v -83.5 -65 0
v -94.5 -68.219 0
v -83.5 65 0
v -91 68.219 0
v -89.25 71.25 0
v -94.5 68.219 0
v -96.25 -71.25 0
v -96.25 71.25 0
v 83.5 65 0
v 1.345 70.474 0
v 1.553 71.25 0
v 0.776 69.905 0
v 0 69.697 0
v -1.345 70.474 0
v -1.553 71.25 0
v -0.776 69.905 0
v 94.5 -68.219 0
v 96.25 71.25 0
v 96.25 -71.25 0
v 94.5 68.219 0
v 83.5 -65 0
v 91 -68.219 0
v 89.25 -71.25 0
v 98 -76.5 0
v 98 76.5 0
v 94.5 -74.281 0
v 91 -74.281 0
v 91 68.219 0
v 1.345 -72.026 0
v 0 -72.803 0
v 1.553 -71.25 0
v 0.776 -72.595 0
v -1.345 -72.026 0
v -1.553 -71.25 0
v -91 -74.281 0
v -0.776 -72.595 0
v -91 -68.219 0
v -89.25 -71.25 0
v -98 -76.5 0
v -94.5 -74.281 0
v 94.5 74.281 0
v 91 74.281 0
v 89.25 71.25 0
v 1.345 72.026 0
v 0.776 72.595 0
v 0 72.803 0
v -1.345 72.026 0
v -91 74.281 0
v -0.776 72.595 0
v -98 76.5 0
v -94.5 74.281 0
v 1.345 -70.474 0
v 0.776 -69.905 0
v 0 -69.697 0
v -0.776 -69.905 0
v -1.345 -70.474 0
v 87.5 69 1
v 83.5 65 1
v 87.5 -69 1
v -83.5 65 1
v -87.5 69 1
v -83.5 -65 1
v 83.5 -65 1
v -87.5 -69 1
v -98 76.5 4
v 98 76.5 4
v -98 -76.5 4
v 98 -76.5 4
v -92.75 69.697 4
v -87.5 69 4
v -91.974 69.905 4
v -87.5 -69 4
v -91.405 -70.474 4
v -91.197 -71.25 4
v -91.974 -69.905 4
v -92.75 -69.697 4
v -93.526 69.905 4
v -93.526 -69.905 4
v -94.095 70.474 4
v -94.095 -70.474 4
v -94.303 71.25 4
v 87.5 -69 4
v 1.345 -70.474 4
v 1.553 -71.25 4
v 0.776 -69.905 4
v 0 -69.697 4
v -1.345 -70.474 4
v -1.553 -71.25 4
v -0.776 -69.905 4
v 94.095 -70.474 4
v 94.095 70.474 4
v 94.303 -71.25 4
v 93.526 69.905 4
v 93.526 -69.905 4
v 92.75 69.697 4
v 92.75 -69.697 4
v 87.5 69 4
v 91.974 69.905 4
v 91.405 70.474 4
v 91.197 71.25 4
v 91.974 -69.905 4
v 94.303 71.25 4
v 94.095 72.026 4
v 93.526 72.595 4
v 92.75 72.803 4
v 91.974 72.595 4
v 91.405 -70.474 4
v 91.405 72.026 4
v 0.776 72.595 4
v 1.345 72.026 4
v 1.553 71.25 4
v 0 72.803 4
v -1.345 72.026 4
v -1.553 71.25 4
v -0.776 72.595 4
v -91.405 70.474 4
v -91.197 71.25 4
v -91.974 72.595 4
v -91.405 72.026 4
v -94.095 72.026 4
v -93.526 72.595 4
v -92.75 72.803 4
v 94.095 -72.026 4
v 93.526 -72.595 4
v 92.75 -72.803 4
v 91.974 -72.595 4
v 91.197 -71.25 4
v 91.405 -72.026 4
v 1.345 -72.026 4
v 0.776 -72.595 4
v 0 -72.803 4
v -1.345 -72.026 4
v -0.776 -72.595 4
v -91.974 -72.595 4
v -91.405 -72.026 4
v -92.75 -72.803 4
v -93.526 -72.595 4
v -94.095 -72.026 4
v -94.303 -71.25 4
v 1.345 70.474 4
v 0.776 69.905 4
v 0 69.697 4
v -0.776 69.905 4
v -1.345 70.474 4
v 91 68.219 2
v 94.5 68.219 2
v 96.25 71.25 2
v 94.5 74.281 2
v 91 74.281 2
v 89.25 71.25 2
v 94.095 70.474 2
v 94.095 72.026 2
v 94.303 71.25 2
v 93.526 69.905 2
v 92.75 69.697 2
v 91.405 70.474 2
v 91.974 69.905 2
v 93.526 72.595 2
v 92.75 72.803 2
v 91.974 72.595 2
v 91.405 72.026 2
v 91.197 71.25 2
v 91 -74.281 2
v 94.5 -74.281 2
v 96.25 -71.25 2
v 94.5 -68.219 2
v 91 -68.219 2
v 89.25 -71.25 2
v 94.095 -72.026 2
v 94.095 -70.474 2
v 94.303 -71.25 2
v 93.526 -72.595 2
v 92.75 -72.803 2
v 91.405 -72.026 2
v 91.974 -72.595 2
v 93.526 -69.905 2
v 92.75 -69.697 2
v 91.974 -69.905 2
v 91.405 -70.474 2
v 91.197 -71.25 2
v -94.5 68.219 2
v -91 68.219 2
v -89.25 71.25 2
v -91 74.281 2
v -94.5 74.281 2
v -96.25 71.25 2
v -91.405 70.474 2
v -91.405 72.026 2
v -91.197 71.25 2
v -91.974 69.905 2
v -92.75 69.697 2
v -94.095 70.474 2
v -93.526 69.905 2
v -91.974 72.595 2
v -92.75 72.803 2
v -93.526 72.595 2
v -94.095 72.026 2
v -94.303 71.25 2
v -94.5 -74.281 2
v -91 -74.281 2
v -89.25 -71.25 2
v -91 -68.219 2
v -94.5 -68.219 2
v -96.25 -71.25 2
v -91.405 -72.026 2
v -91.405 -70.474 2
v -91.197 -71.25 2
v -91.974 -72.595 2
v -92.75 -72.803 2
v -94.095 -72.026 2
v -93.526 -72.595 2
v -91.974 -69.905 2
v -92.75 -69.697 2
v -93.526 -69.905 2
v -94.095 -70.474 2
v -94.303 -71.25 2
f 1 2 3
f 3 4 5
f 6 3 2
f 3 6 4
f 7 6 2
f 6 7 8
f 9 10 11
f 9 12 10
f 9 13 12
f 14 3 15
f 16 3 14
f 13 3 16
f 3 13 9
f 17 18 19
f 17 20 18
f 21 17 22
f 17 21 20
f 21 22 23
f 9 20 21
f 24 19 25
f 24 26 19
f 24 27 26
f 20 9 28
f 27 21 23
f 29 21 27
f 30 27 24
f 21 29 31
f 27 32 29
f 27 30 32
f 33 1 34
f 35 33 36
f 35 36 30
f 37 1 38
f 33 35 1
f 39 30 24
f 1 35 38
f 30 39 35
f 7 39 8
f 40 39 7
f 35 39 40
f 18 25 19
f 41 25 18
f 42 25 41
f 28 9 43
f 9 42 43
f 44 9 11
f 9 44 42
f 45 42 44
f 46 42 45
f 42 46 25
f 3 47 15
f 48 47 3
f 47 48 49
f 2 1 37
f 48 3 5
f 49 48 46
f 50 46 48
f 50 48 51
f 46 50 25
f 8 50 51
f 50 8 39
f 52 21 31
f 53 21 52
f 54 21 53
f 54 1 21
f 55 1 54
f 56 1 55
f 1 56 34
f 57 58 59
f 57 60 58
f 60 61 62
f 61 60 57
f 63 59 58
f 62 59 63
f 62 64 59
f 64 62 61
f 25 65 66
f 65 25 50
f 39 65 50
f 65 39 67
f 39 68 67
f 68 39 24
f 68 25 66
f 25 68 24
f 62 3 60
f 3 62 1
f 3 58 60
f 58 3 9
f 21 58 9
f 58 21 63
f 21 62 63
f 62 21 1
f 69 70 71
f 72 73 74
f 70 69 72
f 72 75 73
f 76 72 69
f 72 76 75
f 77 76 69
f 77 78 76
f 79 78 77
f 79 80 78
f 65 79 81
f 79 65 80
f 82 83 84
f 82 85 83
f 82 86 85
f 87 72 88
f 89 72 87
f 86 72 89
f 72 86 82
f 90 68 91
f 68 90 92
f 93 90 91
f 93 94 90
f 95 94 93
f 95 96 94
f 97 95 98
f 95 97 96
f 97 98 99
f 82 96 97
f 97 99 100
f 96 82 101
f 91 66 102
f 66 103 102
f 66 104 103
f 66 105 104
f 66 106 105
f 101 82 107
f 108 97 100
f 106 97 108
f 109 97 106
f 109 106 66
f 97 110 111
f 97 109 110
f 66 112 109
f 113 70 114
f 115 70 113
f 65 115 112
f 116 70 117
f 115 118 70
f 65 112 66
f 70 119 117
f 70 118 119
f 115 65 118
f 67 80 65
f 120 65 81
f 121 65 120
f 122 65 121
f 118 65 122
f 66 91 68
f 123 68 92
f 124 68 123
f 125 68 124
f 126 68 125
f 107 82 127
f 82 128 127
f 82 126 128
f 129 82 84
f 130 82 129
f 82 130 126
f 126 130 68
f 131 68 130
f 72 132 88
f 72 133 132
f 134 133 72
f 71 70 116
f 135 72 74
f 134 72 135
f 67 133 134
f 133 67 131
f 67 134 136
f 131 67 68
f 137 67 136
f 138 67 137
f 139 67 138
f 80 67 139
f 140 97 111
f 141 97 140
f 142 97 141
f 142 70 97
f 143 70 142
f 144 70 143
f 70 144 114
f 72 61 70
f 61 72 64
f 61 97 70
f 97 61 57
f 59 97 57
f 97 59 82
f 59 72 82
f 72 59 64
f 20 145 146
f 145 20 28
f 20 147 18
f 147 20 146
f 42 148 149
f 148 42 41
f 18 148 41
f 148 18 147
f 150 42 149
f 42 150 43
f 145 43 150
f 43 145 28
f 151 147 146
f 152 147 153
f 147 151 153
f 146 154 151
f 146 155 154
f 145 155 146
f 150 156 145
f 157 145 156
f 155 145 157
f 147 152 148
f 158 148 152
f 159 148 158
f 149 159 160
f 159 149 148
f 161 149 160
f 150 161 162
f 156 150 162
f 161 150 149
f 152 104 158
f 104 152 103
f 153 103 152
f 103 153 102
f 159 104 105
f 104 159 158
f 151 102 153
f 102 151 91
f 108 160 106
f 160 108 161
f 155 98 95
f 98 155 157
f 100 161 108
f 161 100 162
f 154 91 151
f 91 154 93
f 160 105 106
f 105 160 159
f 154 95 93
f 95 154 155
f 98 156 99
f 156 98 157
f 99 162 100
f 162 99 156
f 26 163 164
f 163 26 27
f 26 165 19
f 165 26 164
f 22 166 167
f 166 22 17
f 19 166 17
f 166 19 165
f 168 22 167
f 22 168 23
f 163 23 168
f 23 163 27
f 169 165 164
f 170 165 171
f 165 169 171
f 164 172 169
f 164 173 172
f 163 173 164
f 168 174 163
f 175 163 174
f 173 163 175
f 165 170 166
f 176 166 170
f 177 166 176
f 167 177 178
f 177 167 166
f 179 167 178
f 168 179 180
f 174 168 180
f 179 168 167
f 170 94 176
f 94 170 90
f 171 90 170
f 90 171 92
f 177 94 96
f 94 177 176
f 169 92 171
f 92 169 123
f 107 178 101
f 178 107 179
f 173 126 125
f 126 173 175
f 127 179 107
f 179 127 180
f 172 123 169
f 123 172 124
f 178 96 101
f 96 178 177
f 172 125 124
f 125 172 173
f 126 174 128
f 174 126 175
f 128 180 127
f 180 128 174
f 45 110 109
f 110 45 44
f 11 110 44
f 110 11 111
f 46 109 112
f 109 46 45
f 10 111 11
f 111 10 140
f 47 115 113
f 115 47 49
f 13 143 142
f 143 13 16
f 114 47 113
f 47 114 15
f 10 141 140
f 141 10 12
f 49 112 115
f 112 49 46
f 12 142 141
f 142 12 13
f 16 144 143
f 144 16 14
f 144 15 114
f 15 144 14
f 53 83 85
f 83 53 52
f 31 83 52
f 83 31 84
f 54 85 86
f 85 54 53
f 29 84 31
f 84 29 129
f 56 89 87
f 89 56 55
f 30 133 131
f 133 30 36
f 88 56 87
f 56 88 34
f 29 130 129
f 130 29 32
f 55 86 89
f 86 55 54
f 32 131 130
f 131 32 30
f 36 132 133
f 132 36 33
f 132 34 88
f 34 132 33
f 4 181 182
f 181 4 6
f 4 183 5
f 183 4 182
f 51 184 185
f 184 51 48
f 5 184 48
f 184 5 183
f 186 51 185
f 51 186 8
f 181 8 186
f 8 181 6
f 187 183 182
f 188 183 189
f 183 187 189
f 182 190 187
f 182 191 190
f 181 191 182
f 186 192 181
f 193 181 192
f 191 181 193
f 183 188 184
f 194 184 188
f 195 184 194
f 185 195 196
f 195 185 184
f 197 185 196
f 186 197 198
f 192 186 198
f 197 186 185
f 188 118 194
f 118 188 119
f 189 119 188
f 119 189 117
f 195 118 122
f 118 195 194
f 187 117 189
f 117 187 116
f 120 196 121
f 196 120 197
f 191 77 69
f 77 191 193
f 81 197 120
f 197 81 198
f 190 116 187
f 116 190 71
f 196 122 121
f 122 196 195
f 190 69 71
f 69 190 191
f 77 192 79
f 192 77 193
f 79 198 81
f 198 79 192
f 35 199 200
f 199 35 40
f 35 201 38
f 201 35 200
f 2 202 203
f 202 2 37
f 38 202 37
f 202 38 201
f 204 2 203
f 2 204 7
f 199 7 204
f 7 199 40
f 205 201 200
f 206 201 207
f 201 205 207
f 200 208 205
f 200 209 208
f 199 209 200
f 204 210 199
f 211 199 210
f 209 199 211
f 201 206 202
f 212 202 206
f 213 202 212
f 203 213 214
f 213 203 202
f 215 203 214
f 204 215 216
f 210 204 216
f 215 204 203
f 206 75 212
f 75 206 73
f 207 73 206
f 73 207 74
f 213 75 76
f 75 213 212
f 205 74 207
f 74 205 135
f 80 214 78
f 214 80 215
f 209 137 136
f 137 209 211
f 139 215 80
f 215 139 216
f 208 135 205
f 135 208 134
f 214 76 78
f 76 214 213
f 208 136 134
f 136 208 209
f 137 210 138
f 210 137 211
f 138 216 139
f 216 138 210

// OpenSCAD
// PM8535 LCD screen mount
echo(version=version());

/* [Parts and display] */
// which part to export
part="front"; // [front, back, mounting]
// show facia and screen
show="all"; // [all, parts, none]
// bed width
bed_w = 220;

/* [VDU apature] */
// apature width
apature_w = 180;
// apature height
apature_h = 137;
// apature depth
apature_d = 22;
// amount overlaped behind apature
apature_o = 8;

/* [Mounting points] */
// mounting width
mount_w = 213;
//mounting height
mount_h = 160;
// mounting stud diameter (M4 thread with 7mm nut)
mount_d = 4;
// mounting stud base diameter
mount_base_d = 19;
// mount tab diameter
mount_tab_d = 10;


/* [LCD screen] */
// screen width
screen_w=173;
// screen height
screen_h=136;
// screen depth
screen_d=3;
// additional space between screen and mount
screen_e=1; 

/* [mount face] */
// amount the screen is overlapped by a border
face_o=3; 
// depth to LCD screen 
face_d=1; 

module __Customizer_Limit__ () {}


// calculated values
face_o2 = face_o * 2;
apature_o2 = apature_o * 2;
screen_e2 = screen_e * 2;

// standoff radius
standoff_r = ((apature_w + apature_o2) - (screen_w + screen_e2)) / 4;

// fixing bolts location
bolt_x = ((apature_w + apature_o2) / 2) - standoff_r;
bolt_y = ((apature_h + apature_o2) / 2) - standoff_r;

facia_d = 10; //facia depth
facia_o2 = 20*2; // facia overlap


module cylinder_outer(height,radius,fn) {
   fudge = 1/cos(180/fn);
   cylinder(h=height,r=radius*fudge,$fn=fn);
}
   
module m3_hex_bolt(height) {
    translate([0,0,-0.1]) union() {
        cylinder(h=2.1, r=7/2, $fn=6); // hex head 5mm across flats 2mm high
        translate([0,0,2]) cylinder_outer(height+0.1, 3/2, 12);
    }
}


module bolt_pattern(x,y) {
    translate([ x,  y,    0]) m3_hex_bolt(25);
    translate([ x, -y,    0]) m3_hex_bolt(25);
    translate([ 0,  y, -2.1]) m3_hex_bolt(25);
    translate([ 0, -y, -2.1]) m3_hex_bolt(25);
    translate([-x,  y,    0]) m3_hex_bolt(25);
    translate([-x, -y,    0]) m3_hex_bolt(25);    
}

module prism(l, w, h) {
       polyhedron(
           points=[[0,0,0], [l,0,0], [l,w,0], [0,w,0], [0,w,h], [l,w,h]],
           faces=[[0,1,2,3],[5,4,3,2],[0,4,5,1],[0,3,4],[5,2,1]]
       );
}


module gusset(x, y, height, r, gusset_w) {
    translate([x, y, 0]) rotate([0,0,r]) prism(gusset_w, height, height);
}

module standoff(x, y, height, radius, gusset_w, fn) {
    gusset_l = height;
    translate([x, y, 0]) cylinder(h=height, r = radius, $fn=fn);
    if (x>0) {
        gusset(x-gusset_l-(radius/2), y+(gusset_w/2), height, -90, gusset_w);
    } else {
        gusset(x+gusset_l+(radius/2), y-(gusset_w/2), height, 90, gusset_w);
    }
    if (x==0) {
        // x is corre4ct for centre post gussets
        gusset(x-gusset_l-(radius/2), y+(gusset_w/2), height, -90, gusset_w);
    } else if (y>0) {
        gusset(x-(gusset_w/2), y-gusset_l-(radius/2), height, 0, gusset_w);
    } else {
        gusset(x+(gusset_w/2), y+gusset_l+(radius/2), height, 180, gusset_w);
    }

}

module standoffs(x,y,height, radius, gusset_w, fn) {
    translate([0, 0, 0]) {
        standoff( x,  y,height, radius, gusset_w, fn);
        standoff( x, -y,height, radius, gusset_w, fn);
        standoff( 0,  y,height, radius, gusset_w, fn);
        standoff( 0, -y,height, radius, gusset_w, fn);
        standoff(-x,  y,height, radius, gusset_w, fn);
        standoff(-x, -y,height, radius, gusset_w, fn);
    }
}

module standoff_spacers(x,y,height, radius, fn) {
    translate([x, y, -(height/2)]) cube([radius*2.1,radius*2.1,height],center=true);
    translate([x, -y, -(height/2)]) cube([radius*2.1,radius*2.1,height],center=true);
    translate([-x, y, -(height/2)]) cube([radius*2.1,radius*2.1,height],center=true);
    translate([-x, -y, -(height/2)]) cube([radius*2.1,radius*2.1,height],center=true);
}

module mounting_stud(x, y, height, fn) {
    translate([ x,  y, 0])
        cylinder(h = apature_d - 0.1, r=mount_base_d/2, $fn=fn);
    translate([ x,  y, apature_d-0.1]) 
        cylinder(h = height + 0.1, r=mount_d/2, $fn=fn);
}

module mounting_studs(x,y,height) {
    mounting_stud(x,y, height, 36);
    mounting_stud(-x,y, height, 36);
    mounting_stud(x,-y, height, 36);
    mounting_stud(-x,-y, height, 36);
}

// mounting tab between standoff and mounting stud
// first coordinate is mounting stud, second is standoff
module mounting_tab(x1, y1, tab_r, hole_r, x2, y2, r2, fn) {
    difference() {
        hull() {
          translate([ x1, y1]) circle(r=tab_r, $fn=fn);
          translate([ x2, y2]) circle(r=r2, $fn=fn);
        }
        translate([ x1, y1]) circle(r=hole_r, $fn=fn);
    }
}

module mounting_tabs(x1,y1,tab_r,hole_r, x2,y2,r2, fn) {
    mounting_tab( x1,  y1, tab_r, hole_r,  x2,  y2, r2, fn);
    mounting_tab(-x1,  y1, tab_r, hole_r, -x2,  y2, r2, fn);
    mounting_tab( x1, -y1, tab_r, hole_r,  x2, -y2, r2, fn);
    mounting_tab(-x1, -y1, tab_r, hole_r, -x2, -y2, r2, fn);
}

module ribs(x,y,w,h) {
    translate([ x,  0, h/2]) cube([        w, y * 2 + w, h], center = true);
    translate([-x,  0, h/2]) cube([        w, y * 2 + w, h], center = true);
    translate([ 0,  y, h/2]) cube([x * 2 + w,         w, h], center = true);
    translate([ 0, -y, h/2]) cube([x * 2 + w,         w, h], center = true);
}

module face(h) {
    linear_extrude(height = h)
        difference() {
            square([apature_w + apature_o2, apature_h + apature_o2], center = true);
            square([    screen_w - face_o2, screen_h - face_o2    ], center = true);
        }
}

module front() {
    difference() {
        union() {
            face(face_d);
            // around
            translate([ 0,0,face_d])
            linear_extrude(height = screen_d)
            difference() {
                square([(apature_w + apature_o2), (apature_h + apature_o2)], center = true);
                square([screen_w + screen_e2, screen_h + screen_e2], center=true);    
            }
        }
        // bolt holes
        bolt_pattern(bolt_x, bolt_y);
   }
}

module back() {
    difference() {
        union() {
            face(face_d * 2);
            translate([0,0,face_d*2]) {
                // outer
                ribs(((apature_w + (apature_o2-face_d))/2),
                     ((apature_h + (apature_o2-face_d))/2),
                     face_d,
                     face_d * 2);
                // center
                ribs(bolt_x,
                     bolt_y,
                     face_d,
                     face_d * 2);
                // inner
                ribs(((screen_w - face_o2+ face_d)/2),
                     ((screen_h - face_o2+ face_d)/2),
                     face_d,
                     face_d * 2);
            }
            standoffs(bolt_x,
                      bolt_y,
                      apature_d - (face_d + screen_d),
                      standoff_r,
                      face_d,
                      36);
        }    
        // bolt holes
        translate([ 0,0,-(face_d+screen_d)])
            bolt_pattern(bolt_x, bolt_y);      
   }
}

// mounting bracket attaches assembly to existing mount points
module mounting() {
    inner_w = (apature_w + apature_o2) - (standoff_r * 4);
    inner_h = (apature_h + apature_o2) - (standoff_r * 4);
    
    difference() {
        union() {
            linear_extrude(height = (face_d*2))
            difference() {
                union() {
                    square([(apature_w + apature_o2),
                            (apature_h + apature_o2)],
                           center = true);
                    mounting_tabs(mount_w/2,
                                  mount_h/2,
                                  mount_tab_d/2,
                                  (mount_d+1)/2,
                                  bolt_x,
                                  bolt_y,
                                  standoff_r,
                                  18);
                    
                }
                square([inner_w, inner_h], center=true);
            }
            
            translate([0,0,face_d*2]) { 
                //inner
                ribs(((inner_w + face_d)/2),
                     ((inner_h + face_d)/2),
                     face_d,
                     face_d * 2);
                //outer
                ribs(((apature_w + apature_o2-face_d)/2),
                     ((apature_h + apature_o2-face_d)/2),
                     face_d,
                     face_d * 2);
            }
        }
   
        // bolt holes
        translate([ 0,0,-apature_d])
            bolt_pattern(bolt_x, bolt_y);
        translate([ 0,0,-apature_d])
            mounting_studs((mount_w/2), (mount_h/2), 16);
        // clip to bed width
        translate([ (bed_w + 10) / 2, 0, 0])
            cube([10, 200, 10], center=true);
        translate([-(bed_w + 10) / 2, 0, 0])
            cube([10, 200, 10], center=true);
   }
}

// plots placeholder objects for the screen facia and mounting points
module placeholders() {
    //screen placeholder
    translate([0,0,face_d])
        linear_extrude(height = screen_d)
            square([screen_w,screen_h], center=true);
    //facia placeholder
    translate([0,0,-facia_d])
    linear_extrude(height = facia_d)
    difference() {
        square([(apature_w + facia_o2), (apature_h + facia_o2)], center=true);
        square([apature_w, apature_h], center=true);        
    }
    mounting_studs((mount_w/2), (mount_h/2), 16);
}


if (part=="front") {
    front();
} else {
    if (show=="all" || show=="parts") {
        %front();
    }
}

*    translate([0,0,face_d])
        linear_extrude(height = screen_d)
            square([screen_w,screen_h], center=true);

translate([ 0,0,face_d+screen_d])
if (part=="back") {
    back();
} else {
    if (show=="all" || show=="parts") {
        %back();
    }
}

translate([ 0,0,apature_d])
if (part=="mounting") {
    mounting();
} else {
    if (show=="all" || show=="parts") {
        %mounting();
    }
}

if (show=="all") {
    %placeholders();
}
